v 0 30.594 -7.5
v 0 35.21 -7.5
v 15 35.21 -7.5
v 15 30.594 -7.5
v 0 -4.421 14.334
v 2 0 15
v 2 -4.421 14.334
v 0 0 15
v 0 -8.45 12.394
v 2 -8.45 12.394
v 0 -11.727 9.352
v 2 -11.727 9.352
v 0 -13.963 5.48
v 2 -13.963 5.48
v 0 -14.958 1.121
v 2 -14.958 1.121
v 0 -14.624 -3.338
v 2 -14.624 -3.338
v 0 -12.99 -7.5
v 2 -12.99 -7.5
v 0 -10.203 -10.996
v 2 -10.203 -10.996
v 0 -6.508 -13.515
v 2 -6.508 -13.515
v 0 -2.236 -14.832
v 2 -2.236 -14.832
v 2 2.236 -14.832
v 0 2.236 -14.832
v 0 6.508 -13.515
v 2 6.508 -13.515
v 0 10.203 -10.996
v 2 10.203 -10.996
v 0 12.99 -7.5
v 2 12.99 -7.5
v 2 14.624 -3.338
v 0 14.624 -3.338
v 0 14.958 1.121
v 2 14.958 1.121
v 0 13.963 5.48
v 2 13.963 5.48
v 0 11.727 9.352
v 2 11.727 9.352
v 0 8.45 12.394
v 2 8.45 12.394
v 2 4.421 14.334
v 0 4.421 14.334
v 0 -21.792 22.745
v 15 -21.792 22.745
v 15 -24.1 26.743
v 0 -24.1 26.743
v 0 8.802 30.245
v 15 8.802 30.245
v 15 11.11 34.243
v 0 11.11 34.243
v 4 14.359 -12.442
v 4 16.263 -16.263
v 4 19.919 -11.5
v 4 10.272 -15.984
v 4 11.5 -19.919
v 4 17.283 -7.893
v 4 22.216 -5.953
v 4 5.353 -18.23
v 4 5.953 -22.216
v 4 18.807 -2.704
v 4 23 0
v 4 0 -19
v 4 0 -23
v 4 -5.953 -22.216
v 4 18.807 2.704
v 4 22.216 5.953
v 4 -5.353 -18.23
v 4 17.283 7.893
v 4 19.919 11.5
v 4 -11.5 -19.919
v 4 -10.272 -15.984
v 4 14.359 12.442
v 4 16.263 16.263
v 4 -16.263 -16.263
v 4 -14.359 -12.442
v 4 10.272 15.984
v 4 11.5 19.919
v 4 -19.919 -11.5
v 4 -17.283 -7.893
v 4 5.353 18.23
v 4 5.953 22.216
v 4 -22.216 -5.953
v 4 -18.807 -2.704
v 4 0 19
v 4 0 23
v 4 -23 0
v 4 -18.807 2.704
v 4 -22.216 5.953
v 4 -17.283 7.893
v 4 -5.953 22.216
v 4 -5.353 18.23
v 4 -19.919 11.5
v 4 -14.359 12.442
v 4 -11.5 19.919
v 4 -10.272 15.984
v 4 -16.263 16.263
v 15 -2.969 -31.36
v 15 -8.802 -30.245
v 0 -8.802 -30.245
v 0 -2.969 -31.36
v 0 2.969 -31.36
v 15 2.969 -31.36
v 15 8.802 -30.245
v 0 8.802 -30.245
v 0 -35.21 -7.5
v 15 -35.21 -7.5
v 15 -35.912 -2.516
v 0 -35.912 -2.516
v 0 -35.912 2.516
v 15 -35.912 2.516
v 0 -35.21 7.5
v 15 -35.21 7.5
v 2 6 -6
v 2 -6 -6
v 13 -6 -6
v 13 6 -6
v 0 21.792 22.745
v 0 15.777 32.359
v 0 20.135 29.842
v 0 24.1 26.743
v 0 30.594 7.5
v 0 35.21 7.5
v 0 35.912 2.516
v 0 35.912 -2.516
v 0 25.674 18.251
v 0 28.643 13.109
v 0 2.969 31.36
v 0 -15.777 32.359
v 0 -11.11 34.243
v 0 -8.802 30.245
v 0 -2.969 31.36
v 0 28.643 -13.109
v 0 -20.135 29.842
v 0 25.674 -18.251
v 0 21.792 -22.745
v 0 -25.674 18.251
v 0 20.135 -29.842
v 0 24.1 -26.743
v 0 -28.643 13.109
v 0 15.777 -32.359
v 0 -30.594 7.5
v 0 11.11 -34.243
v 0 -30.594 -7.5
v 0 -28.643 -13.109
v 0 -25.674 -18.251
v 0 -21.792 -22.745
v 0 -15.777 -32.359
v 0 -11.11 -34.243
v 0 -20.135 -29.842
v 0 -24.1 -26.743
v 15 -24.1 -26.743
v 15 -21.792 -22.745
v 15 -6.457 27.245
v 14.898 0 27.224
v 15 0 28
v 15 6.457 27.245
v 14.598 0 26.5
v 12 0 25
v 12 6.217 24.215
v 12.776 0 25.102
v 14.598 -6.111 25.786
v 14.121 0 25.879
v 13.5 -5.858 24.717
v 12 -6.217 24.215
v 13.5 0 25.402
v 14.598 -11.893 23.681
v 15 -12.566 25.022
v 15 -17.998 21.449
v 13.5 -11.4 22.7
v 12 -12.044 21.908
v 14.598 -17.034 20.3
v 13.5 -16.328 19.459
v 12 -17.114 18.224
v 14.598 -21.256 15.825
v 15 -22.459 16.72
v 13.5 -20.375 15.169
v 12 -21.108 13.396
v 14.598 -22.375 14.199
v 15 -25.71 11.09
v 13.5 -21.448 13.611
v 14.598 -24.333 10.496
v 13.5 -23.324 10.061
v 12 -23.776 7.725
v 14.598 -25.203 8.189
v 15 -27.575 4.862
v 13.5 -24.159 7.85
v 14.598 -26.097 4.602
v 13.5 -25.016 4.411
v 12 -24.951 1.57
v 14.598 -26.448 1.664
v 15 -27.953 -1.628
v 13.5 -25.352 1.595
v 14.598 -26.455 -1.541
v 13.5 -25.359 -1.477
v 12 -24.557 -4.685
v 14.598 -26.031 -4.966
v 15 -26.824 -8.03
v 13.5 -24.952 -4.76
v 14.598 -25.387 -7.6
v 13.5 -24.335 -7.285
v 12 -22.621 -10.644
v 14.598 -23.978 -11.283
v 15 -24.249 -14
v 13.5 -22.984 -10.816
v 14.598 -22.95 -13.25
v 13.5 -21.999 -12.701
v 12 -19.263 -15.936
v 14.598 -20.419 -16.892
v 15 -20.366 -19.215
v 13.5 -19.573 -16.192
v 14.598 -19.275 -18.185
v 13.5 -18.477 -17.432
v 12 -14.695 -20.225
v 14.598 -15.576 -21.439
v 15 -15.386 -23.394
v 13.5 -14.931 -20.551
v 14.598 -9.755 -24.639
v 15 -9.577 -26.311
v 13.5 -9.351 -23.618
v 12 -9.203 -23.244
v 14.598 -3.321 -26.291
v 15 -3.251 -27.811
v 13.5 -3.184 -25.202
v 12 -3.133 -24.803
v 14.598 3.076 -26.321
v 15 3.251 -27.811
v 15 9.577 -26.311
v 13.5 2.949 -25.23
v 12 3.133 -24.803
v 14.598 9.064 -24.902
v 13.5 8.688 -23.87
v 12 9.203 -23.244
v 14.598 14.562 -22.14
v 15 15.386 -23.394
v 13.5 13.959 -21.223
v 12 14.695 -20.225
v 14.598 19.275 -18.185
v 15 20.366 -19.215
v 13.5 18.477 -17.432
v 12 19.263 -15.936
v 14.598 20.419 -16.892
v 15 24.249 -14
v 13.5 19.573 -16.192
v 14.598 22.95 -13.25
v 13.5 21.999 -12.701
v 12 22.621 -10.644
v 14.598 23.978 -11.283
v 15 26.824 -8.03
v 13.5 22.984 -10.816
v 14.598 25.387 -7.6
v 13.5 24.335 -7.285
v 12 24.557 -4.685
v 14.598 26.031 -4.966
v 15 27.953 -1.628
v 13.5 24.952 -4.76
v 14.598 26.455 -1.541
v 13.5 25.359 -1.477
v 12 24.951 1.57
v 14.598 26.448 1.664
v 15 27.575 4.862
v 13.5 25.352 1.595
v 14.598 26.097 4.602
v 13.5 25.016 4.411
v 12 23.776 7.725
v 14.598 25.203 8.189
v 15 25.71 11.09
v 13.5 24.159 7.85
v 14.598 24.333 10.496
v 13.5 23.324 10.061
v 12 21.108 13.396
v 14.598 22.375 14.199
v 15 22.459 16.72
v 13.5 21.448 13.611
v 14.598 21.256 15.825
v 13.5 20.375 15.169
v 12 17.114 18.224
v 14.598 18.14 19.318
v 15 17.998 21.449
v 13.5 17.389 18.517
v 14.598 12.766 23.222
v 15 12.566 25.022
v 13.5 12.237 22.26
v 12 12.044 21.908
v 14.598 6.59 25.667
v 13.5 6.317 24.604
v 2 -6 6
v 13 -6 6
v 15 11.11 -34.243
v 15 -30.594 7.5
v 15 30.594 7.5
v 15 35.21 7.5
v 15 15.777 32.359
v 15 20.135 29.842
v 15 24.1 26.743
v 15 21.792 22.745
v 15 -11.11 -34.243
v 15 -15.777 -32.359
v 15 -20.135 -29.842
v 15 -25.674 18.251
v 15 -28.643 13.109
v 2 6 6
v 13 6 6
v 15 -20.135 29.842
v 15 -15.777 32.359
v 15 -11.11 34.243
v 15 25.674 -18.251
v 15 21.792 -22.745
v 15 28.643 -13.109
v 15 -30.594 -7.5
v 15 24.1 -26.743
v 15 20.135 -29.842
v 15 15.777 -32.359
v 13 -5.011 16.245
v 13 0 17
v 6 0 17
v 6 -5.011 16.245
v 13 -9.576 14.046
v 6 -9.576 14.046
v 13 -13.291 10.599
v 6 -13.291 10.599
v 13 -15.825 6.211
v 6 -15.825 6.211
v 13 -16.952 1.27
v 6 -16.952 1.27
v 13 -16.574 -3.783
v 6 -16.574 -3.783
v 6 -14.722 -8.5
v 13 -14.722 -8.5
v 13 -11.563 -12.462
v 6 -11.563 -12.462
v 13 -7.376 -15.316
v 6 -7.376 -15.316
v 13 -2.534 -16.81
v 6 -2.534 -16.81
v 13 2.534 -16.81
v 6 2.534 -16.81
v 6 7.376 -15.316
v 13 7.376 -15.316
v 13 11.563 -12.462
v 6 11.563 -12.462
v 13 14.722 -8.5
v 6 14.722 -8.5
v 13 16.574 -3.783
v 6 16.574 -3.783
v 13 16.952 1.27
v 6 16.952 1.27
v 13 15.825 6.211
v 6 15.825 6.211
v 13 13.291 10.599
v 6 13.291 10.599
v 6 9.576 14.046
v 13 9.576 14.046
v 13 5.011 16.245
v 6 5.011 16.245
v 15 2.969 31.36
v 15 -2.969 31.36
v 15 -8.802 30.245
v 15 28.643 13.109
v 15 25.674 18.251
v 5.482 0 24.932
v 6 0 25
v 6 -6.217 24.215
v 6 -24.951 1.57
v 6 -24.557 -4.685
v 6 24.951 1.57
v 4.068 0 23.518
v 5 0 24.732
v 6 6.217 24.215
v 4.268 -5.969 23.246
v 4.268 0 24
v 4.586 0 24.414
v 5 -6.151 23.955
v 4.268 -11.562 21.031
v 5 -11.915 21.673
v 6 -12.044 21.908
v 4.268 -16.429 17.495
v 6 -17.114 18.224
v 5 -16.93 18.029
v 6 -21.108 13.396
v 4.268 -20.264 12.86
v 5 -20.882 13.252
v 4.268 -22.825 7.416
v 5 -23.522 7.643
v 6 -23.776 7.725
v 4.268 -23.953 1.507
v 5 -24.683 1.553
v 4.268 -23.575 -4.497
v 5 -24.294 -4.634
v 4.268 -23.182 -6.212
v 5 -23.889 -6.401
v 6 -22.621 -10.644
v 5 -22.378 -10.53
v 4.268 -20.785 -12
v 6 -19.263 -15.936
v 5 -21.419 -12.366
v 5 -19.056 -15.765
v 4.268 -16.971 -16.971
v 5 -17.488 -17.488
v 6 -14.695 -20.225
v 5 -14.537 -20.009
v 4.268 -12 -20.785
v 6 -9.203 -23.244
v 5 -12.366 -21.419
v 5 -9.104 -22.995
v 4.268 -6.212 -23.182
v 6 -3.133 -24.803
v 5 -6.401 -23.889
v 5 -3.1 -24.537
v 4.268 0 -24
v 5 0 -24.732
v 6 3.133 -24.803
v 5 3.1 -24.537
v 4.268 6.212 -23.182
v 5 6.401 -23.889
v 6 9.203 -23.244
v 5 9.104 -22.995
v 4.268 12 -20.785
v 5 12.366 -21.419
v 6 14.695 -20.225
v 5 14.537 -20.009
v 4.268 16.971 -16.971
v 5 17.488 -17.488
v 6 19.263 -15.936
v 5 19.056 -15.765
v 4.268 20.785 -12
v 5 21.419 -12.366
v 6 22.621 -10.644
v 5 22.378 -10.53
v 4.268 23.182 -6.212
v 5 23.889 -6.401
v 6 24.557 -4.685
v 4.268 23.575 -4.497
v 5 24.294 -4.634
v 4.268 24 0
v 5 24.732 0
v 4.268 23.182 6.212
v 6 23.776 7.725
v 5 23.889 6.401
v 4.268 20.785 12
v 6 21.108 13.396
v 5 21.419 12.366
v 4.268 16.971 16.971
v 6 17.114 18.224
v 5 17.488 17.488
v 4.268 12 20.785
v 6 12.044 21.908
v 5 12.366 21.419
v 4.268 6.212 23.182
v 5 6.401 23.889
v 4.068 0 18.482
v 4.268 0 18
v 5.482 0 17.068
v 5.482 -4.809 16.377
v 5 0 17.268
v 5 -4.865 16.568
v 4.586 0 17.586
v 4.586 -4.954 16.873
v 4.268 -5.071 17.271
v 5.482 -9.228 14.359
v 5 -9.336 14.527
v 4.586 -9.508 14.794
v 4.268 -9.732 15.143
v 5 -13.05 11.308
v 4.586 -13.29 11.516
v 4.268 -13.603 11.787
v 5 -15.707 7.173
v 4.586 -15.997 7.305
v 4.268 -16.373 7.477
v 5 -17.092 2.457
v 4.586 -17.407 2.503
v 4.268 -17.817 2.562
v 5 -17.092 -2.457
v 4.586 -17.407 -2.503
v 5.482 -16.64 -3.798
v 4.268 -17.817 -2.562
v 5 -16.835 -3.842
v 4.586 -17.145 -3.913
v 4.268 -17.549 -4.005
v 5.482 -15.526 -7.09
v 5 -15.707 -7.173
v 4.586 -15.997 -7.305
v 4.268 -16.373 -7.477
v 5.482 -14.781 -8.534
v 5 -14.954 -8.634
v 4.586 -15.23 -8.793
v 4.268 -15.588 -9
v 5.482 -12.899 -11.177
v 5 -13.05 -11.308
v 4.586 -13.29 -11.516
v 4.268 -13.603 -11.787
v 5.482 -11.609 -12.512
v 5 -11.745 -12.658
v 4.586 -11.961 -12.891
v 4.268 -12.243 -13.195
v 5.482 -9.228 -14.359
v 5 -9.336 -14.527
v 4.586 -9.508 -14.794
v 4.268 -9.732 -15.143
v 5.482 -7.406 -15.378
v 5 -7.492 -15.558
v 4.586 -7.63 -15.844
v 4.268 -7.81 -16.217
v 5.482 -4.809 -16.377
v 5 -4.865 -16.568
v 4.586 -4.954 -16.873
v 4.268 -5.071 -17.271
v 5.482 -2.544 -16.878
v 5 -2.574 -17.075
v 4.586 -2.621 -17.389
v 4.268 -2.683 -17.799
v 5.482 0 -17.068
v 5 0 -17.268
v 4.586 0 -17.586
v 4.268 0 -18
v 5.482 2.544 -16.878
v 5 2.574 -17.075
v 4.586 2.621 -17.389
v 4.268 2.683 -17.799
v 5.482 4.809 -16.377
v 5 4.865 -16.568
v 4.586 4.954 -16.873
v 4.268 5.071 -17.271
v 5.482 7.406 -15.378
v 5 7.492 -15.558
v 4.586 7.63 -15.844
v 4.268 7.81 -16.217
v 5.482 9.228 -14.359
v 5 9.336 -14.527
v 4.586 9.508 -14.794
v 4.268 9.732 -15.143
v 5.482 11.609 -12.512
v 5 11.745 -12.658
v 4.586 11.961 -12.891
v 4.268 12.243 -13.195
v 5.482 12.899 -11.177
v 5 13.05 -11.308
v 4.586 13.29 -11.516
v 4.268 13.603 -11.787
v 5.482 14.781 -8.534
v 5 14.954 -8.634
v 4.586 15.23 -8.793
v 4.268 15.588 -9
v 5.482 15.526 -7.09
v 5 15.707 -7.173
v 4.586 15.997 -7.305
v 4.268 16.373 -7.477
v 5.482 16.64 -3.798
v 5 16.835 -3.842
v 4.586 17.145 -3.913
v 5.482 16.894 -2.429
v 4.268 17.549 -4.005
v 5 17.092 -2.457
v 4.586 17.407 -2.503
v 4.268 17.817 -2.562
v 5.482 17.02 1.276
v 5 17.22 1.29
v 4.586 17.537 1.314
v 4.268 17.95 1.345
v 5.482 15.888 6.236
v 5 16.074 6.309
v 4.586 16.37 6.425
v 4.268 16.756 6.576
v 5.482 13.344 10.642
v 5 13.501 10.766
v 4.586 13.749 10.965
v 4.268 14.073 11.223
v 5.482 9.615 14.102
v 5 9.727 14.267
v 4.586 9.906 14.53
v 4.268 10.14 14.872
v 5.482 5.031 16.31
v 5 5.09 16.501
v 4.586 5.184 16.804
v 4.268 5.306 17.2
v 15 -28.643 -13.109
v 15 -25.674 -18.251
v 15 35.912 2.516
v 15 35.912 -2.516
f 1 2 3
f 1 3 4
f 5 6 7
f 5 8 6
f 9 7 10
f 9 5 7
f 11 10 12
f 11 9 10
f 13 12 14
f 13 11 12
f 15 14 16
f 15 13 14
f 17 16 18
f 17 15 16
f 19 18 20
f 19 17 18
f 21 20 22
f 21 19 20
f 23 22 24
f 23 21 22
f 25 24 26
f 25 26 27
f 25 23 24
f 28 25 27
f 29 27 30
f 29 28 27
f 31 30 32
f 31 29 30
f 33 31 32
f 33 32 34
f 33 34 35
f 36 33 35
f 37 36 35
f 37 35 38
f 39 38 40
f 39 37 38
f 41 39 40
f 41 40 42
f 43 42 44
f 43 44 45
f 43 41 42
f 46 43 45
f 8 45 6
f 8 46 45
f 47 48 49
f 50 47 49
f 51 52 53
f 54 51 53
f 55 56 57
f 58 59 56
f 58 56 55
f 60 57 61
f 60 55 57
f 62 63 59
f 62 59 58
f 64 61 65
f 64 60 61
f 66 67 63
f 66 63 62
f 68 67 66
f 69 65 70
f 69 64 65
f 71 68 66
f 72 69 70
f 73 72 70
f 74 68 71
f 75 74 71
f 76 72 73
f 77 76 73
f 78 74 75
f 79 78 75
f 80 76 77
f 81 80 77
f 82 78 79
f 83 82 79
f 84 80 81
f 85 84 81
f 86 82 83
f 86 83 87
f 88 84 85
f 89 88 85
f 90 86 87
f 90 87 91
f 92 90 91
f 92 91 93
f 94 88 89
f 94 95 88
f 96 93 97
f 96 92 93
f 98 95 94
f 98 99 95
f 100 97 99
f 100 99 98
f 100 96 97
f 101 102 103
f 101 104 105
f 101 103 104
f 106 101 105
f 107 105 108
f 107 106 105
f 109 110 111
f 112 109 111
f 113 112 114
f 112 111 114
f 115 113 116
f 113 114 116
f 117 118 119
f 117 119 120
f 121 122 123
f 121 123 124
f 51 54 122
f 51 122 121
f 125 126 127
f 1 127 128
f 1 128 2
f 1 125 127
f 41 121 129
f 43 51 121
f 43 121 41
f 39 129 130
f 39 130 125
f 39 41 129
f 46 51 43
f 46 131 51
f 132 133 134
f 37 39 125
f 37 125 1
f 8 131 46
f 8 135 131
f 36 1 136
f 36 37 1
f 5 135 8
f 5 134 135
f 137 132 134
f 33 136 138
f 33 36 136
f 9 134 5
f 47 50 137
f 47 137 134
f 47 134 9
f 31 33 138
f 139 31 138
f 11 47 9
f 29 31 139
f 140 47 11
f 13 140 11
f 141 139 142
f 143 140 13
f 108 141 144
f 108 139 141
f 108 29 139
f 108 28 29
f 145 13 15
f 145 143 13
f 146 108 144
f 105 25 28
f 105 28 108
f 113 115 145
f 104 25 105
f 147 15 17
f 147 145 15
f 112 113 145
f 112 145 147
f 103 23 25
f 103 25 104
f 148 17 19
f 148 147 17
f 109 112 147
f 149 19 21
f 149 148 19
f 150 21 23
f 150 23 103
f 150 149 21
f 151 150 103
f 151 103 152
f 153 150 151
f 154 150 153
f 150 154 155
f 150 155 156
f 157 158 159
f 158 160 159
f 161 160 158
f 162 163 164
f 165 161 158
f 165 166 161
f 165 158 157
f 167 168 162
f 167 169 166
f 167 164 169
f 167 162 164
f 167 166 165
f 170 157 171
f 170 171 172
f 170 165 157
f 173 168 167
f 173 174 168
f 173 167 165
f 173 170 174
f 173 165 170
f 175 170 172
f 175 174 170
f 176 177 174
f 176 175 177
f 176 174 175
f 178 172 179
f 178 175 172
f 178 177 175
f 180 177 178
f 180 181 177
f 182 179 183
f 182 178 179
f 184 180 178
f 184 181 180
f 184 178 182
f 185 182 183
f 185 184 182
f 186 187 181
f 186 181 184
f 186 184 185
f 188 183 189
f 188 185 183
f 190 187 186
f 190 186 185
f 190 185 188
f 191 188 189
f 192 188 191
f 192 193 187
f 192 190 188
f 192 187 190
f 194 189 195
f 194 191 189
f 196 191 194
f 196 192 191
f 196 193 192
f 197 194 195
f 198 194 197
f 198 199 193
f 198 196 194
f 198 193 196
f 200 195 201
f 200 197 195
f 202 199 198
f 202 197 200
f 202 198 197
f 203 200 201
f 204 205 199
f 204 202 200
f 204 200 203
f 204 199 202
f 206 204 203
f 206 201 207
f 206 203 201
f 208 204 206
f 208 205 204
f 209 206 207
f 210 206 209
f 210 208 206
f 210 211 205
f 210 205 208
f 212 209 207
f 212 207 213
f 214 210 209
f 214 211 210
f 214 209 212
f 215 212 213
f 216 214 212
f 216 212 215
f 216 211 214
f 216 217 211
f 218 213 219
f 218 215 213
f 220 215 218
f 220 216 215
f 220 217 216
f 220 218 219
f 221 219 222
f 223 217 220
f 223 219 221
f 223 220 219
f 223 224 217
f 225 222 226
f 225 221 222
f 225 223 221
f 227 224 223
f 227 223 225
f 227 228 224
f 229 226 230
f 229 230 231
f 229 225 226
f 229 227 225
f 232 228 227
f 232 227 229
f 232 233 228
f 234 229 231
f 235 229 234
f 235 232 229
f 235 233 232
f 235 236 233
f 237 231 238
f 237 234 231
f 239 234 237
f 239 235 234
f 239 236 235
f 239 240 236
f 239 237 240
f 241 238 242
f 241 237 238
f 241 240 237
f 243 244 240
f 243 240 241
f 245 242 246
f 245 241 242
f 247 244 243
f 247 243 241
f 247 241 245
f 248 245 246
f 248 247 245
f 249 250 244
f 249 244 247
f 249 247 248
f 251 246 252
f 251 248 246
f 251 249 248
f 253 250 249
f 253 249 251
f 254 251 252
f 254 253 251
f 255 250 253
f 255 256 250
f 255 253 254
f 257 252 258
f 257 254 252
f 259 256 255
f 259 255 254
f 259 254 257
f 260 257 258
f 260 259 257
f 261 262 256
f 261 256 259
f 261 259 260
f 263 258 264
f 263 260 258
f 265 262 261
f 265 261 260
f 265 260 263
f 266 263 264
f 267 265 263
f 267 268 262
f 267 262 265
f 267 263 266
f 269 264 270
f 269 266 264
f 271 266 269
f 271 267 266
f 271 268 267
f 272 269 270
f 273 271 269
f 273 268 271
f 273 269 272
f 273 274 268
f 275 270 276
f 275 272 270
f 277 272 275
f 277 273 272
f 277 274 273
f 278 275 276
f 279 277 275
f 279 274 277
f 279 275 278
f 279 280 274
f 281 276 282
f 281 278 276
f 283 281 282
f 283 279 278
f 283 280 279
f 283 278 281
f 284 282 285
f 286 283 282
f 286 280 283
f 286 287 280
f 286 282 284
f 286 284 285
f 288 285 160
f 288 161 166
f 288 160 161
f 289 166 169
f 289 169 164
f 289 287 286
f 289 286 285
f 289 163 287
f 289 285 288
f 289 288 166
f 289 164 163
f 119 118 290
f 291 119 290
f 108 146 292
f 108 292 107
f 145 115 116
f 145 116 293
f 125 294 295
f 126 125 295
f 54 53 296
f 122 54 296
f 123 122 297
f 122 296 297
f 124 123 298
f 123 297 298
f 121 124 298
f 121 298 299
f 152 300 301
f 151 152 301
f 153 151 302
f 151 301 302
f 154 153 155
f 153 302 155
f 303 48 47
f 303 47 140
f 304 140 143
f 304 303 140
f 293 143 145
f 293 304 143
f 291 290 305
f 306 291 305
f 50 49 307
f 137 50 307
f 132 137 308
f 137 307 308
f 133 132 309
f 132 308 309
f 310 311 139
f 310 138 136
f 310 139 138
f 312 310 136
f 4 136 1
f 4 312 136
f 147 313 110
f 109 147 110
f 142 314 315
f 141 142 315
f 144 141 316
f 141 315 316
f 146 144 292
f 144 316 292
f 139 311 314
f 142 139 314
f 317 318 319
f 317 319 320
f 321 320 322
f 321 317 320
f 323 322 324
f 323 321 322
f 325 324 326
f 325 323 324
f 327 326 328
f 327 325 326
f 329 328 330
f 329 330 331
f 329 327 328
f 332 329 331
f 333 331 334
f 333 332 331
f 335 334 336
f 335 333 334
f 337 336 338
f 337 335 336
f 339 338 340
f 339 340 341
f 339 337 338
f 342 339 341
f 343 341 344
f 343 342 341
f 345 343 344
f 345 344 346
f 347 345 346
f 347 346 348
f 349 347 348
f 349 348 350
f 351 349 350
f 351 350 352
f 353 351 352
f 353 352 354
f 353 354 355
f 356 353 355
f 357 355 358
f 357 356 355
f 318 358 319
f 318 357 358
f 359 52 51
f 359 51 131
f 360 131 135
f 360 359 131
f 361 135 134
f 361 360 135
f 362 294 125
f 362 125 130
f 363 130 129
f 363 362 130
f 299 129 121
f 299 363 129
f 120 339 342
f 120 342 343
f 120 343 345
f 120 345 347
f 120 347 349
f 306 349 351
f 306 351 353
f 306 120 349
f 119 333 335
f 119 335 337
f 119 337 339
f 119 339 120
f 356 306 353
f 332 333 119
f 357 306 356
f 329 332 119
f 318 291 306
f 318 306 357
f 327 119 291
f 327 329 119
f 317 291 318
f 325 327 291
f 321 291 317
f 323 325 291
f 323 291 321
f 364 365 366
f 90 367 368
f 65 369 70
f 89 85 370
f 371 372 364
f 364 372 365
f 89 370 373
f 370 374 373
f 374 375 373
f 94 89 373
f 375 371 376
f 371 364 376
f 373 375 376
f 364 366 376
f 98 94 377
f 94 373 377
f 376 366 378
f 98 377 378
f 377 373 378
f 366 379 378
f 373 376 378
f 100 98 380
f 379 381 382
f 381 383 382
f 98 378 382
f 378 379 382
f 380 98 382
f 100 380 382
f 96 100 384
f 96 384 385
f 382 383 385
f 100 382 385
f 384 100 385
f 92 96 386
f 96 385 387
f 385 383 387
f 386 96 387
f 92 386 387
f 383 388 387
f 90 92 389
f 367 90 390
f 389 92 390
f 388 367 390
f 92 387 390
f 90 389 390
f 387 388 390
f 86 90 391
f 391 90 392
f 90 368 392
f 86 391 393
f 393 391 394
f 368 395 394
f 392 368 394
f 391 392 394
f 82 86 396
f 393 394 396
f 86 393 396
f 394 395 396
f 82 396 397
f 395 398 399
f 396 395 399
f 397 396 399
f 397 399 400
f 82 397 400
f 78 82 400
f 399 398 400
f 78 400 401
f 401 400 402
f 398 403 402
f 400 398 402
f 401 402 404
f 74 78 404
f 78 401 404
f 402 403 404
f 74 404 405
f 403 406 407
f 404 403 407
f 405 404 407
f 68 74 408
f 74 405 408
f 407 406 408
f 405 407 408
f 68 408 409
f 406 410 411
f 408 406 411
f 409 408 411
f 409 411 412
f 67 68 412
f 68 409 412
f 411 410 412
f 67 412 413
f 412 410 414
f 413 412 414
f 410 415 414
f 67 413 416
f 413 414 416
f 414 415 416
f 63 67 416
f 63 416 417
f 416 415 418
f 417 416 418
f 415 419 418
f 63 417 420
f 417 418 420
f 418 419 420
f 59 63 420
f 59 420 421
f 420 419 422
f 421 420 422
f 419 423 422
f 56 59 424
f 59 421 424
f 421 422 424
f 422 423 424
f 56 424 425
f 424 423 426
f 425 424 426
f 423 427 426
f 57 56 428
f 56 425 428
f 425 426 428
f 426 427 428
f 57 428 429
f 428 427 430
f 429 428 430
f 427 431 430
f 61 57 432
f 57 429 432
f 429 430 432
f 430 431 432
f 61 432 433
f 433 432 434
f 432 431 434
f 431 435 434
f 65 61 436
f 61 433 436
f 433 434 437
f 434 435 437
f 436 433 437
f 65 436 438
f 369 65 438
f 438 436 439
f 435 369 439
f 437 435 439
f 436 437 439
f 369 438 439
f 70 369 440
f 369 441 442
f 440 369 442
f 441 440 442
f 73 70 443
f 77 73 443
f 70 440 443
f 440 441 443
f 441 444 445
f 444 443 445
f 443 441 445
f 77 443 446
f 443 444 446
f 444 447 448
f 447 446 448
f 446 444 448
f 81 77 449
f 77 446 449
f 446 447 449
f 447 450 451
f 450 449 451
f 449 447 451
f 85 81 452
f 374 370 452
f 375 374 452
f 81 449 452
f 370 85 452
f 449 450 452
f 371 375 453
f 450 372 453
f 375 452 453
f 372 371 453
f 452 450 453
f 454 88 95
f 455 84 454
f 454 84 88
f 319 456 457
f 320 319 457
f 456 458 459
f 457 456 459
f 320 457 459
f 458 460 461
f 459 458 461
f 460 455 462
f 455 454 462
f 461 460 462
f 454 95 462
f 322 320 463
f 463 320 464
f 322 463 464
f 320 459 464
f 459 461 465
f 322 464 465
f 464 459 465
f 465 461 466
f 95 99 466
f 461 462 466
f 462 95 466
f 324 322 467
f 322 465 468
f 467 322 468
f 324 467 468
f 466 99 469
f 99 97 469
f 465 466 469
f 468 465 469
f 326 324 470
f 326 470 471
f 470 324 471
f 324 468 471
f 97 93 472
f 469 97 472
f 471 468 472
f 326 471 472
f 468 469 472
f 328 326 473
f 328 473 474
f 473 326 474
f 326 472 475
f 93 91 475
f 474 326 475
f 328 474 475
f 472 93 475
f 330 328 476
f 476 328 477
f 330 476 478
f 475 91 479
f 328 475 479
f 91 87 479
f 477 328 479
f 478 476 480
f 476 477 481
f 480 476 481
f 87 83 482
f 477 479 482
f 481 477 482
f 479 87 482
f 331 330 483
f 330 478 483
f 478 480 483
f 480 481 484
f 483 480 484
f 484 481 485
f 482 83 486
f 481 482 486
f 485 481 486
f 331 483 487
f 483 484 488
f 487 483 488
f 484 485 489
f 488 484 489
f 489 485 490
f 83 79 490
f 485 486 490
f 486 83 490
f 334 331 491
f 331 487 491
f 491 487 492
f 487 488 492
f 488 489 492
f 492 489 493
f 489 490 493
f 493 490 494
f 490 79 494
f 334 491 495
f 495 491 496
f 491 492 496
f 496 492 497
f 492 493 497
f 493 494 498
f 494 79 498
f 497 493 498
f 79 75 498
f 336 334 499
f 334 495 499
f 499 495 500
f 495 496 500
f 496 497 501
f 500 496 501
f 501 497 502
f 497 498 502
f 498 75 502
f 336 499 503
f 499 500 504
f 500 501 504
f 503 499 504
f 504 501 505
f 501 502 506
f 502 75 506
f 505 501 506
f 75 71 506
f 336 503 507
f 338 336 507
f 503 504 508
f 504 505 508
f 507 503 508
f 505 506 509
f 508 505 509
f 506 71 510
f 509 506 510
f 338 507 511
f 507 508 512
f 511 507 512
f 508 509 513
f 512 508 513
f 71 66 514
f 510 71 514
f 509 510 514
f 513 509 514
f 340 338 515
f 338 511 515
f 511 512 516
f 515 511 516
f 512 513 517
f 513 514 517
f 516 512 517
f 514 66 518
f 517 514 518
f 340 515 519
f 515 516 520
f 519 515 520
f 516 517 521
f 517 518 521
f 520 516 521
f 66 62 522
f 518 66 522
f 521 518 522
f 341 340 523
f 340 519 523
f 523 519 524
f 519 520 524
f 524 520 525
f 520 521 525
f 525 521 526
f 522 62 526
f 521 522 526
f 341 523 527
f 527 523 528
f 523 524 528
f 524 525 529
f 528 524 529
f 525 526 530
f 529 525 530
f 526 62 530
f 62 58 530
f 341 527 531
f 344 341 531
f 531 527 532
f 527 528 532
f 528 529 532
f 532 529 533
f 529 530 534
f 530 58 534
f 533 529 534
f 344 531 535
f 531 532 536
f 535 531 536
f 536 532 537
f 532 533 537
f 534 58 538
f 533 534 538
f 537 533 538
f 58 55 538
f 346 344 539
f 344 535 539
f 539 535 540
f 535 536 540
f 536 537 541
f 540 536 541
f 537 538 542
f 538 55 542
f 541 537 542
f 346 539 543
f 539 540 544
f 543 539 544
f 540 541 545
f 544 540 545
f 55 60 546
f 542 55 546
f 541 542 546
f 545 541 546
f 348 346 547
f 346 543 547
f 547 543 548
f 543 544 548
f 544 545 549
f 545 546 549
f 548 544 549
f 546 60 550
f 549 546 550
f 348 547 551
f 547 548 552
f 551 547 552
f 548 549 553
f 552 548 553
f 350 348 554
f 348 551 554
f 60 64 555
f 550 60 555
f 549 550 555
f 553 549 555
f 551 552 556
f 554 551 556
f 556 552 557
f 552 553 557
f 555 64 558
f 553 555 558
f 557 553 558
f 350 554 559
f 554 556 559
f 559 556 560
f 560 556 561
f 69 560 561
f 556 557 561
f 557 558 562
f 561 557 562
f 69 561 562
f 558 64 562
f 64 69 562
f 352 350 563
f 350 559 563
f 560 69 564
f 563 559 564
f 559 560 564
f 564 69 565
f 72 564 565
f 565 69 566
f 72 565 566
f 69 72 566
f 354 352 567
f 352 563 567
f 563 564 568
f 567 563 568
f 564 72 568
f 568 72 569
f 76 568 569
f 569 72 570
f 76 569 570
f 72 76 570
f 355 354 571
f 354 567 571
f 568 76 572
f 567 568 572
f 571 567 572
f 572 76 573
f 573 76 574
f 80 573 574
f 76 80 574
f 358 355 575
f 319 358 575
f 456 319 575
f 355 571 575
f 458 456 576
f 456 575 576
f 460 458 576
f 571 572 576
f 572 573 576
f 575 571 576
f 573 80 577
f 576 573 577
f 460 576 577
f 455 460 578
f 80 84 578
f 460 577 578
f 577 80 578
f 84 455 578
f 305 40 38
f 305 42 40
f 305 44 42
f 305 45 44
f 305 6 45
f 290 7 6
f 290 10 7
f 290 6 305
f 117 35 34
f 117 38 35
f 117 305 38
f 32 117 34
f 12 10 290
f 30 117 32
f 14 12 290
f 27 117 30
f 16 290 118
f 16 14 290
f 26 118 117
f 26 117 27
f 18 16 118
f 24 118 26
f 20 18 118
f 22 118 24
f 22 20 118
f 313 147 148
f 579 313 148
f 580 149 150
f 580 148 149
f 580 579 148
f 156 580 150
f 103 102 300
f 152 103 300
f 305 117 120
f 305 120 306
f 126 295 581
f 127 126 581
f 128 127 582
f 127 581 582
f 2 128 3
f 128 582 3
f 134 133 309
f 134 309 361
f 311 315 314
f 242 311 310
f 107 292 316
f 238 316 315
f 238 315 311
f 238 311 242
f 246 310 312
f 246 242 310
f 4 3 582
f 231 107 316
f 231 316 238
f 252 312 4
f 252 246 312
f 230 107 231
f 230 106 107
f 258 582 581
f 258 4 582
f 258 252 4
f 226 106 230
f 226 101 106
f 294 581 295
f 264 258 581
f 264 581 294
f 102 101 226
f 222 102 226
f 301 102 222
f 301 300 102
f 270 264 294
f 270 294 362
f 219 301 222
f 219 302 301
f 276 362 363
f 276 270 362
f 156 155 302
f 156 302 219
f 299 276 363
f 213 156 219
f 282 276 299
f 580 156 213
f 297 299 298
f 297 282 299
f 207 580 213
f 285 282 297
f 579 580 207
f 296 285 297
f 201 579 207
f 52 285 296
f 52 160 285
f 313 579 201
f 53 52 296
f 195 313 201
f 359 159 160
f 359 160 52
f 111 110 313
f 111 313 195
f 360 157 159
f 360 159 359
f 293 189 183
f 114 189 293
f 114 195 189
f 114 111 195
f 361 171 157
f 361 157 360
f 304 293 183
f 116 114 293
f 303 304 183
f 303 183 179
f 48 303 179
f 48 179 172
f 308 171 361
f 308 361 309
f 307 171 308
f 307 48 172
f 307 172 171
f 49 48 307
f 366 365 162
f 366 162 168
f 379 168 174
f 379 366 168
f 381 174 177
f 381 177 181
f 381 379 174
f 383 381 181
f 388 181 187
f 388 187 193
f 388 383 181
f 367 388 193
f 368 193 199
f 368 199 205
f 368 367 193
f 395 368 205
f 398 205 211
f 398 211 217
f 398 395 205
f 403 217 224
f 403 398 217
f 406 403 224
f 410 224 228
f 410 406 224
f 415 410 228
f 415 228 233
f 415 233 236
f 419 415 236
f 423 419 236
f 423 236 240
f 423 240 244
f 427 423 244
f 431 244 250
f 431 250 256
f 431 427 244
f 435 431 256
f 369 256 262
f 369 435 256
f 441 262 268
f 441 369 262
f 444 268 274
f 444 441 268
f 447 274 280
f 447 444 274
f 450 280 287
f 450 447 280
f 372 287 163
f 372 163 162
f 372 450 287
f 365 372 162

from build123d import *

# Parameters (mm, degrees)
SKETCH_2_W               = 12
SKETCH_2_H               = 12
CUT_EXTRUDE_1_DEPTH      = 47.405818601
EXTRUDE_START            = -15
EXTRUDE_1_DEPTH          = 15
PATTERN_CIRCULAR_1_COUNT = 6
FILLET_1_R               = 2


with BuildPart() as part:
    # Эскиз1 → Повернуть1 (revolve)
    with BuildSketch(Plane.XY, mode=Mode.PRIVATE) as revolve_1_sk:
        with BuildLine():
            Line((2, 0), (2, 15))
            Line((2, 15), (0, 15))
            Line((0, 15), (0, 31.5))
            Line((0, 31.5), (15, 31.5))
            Line((15, 31.5), (15, 28))
            ThreePointArc((15, 28), (14.121320344, 25.878679656), (12, 25))
            Line((12, 25), (4, 25))
            Line((4, 25), (4, 17))
            Line((4, 17), (13, 17))
            Line((13, 17), (13, 0))
            Line((13, 0), (2, 0))
        make_face()
    revolve(revolve_1_sk.sketch.rotate(Axis((0, 0, 0), (1, 0, 0)), 90), axis=Axis((0, 0, 0), (1, 0, 0)))

    # Эскиз2 → Вырез-Вытянуть1 (cut, through all)
    with BuildSketch(Plane.ZY.offset(-2)):
        Rectangle(SKETCH_2_W, SKETCH_2_H)
    extrude(amount=-CUT_EXTRUDE_1_DEPTH, mode=Mode.SUBTRACT)

    # Эскиз3 → Бобышка-Вытянуть1 (add)
    with BuildSketch(Plane.ZY.offset(EXTRUDE_START)):
        with BuildLine():
            ThreePointArc((7.5, 35.210083783), (0, 36), (-7.5, 35.210083783))
            Line((-7.5, 35.210083783), (-7.5, 30.594117082))
            ThreePointArc((-7.5, 30.594117082), (0, 31.5), (7.5, 30.594117082))
            Line((7.5, 30.594117082), (7.5, 35.210083783))
        make_face()
    extrude_1 = extrude(amount=EXTRUDE_1_DEPTH)

    # Круговой массив1: Бобышка-Вытянуть1 ×6 about axis
    pattern_circular_1_axis = Axis((0, 0, 0), (1, 0, 0))
    for i in range(1, PATTERN_CIRCULAR_1_COUNT):
        add(extrude_1.rotate(pattern_circular_1_axis, i * 360 / PATTERN_CIRCULAR_1_COUNT))

    # Скругление1
    fillet_1_edges = [part.edges().sort_by_distance(p)[0] for p in [
        (4, 0, -17),
        (4, 0, -25),
    ]]
    fillet(fillet_1_edges, radius=FILLET_1_R)


solid = part.part
